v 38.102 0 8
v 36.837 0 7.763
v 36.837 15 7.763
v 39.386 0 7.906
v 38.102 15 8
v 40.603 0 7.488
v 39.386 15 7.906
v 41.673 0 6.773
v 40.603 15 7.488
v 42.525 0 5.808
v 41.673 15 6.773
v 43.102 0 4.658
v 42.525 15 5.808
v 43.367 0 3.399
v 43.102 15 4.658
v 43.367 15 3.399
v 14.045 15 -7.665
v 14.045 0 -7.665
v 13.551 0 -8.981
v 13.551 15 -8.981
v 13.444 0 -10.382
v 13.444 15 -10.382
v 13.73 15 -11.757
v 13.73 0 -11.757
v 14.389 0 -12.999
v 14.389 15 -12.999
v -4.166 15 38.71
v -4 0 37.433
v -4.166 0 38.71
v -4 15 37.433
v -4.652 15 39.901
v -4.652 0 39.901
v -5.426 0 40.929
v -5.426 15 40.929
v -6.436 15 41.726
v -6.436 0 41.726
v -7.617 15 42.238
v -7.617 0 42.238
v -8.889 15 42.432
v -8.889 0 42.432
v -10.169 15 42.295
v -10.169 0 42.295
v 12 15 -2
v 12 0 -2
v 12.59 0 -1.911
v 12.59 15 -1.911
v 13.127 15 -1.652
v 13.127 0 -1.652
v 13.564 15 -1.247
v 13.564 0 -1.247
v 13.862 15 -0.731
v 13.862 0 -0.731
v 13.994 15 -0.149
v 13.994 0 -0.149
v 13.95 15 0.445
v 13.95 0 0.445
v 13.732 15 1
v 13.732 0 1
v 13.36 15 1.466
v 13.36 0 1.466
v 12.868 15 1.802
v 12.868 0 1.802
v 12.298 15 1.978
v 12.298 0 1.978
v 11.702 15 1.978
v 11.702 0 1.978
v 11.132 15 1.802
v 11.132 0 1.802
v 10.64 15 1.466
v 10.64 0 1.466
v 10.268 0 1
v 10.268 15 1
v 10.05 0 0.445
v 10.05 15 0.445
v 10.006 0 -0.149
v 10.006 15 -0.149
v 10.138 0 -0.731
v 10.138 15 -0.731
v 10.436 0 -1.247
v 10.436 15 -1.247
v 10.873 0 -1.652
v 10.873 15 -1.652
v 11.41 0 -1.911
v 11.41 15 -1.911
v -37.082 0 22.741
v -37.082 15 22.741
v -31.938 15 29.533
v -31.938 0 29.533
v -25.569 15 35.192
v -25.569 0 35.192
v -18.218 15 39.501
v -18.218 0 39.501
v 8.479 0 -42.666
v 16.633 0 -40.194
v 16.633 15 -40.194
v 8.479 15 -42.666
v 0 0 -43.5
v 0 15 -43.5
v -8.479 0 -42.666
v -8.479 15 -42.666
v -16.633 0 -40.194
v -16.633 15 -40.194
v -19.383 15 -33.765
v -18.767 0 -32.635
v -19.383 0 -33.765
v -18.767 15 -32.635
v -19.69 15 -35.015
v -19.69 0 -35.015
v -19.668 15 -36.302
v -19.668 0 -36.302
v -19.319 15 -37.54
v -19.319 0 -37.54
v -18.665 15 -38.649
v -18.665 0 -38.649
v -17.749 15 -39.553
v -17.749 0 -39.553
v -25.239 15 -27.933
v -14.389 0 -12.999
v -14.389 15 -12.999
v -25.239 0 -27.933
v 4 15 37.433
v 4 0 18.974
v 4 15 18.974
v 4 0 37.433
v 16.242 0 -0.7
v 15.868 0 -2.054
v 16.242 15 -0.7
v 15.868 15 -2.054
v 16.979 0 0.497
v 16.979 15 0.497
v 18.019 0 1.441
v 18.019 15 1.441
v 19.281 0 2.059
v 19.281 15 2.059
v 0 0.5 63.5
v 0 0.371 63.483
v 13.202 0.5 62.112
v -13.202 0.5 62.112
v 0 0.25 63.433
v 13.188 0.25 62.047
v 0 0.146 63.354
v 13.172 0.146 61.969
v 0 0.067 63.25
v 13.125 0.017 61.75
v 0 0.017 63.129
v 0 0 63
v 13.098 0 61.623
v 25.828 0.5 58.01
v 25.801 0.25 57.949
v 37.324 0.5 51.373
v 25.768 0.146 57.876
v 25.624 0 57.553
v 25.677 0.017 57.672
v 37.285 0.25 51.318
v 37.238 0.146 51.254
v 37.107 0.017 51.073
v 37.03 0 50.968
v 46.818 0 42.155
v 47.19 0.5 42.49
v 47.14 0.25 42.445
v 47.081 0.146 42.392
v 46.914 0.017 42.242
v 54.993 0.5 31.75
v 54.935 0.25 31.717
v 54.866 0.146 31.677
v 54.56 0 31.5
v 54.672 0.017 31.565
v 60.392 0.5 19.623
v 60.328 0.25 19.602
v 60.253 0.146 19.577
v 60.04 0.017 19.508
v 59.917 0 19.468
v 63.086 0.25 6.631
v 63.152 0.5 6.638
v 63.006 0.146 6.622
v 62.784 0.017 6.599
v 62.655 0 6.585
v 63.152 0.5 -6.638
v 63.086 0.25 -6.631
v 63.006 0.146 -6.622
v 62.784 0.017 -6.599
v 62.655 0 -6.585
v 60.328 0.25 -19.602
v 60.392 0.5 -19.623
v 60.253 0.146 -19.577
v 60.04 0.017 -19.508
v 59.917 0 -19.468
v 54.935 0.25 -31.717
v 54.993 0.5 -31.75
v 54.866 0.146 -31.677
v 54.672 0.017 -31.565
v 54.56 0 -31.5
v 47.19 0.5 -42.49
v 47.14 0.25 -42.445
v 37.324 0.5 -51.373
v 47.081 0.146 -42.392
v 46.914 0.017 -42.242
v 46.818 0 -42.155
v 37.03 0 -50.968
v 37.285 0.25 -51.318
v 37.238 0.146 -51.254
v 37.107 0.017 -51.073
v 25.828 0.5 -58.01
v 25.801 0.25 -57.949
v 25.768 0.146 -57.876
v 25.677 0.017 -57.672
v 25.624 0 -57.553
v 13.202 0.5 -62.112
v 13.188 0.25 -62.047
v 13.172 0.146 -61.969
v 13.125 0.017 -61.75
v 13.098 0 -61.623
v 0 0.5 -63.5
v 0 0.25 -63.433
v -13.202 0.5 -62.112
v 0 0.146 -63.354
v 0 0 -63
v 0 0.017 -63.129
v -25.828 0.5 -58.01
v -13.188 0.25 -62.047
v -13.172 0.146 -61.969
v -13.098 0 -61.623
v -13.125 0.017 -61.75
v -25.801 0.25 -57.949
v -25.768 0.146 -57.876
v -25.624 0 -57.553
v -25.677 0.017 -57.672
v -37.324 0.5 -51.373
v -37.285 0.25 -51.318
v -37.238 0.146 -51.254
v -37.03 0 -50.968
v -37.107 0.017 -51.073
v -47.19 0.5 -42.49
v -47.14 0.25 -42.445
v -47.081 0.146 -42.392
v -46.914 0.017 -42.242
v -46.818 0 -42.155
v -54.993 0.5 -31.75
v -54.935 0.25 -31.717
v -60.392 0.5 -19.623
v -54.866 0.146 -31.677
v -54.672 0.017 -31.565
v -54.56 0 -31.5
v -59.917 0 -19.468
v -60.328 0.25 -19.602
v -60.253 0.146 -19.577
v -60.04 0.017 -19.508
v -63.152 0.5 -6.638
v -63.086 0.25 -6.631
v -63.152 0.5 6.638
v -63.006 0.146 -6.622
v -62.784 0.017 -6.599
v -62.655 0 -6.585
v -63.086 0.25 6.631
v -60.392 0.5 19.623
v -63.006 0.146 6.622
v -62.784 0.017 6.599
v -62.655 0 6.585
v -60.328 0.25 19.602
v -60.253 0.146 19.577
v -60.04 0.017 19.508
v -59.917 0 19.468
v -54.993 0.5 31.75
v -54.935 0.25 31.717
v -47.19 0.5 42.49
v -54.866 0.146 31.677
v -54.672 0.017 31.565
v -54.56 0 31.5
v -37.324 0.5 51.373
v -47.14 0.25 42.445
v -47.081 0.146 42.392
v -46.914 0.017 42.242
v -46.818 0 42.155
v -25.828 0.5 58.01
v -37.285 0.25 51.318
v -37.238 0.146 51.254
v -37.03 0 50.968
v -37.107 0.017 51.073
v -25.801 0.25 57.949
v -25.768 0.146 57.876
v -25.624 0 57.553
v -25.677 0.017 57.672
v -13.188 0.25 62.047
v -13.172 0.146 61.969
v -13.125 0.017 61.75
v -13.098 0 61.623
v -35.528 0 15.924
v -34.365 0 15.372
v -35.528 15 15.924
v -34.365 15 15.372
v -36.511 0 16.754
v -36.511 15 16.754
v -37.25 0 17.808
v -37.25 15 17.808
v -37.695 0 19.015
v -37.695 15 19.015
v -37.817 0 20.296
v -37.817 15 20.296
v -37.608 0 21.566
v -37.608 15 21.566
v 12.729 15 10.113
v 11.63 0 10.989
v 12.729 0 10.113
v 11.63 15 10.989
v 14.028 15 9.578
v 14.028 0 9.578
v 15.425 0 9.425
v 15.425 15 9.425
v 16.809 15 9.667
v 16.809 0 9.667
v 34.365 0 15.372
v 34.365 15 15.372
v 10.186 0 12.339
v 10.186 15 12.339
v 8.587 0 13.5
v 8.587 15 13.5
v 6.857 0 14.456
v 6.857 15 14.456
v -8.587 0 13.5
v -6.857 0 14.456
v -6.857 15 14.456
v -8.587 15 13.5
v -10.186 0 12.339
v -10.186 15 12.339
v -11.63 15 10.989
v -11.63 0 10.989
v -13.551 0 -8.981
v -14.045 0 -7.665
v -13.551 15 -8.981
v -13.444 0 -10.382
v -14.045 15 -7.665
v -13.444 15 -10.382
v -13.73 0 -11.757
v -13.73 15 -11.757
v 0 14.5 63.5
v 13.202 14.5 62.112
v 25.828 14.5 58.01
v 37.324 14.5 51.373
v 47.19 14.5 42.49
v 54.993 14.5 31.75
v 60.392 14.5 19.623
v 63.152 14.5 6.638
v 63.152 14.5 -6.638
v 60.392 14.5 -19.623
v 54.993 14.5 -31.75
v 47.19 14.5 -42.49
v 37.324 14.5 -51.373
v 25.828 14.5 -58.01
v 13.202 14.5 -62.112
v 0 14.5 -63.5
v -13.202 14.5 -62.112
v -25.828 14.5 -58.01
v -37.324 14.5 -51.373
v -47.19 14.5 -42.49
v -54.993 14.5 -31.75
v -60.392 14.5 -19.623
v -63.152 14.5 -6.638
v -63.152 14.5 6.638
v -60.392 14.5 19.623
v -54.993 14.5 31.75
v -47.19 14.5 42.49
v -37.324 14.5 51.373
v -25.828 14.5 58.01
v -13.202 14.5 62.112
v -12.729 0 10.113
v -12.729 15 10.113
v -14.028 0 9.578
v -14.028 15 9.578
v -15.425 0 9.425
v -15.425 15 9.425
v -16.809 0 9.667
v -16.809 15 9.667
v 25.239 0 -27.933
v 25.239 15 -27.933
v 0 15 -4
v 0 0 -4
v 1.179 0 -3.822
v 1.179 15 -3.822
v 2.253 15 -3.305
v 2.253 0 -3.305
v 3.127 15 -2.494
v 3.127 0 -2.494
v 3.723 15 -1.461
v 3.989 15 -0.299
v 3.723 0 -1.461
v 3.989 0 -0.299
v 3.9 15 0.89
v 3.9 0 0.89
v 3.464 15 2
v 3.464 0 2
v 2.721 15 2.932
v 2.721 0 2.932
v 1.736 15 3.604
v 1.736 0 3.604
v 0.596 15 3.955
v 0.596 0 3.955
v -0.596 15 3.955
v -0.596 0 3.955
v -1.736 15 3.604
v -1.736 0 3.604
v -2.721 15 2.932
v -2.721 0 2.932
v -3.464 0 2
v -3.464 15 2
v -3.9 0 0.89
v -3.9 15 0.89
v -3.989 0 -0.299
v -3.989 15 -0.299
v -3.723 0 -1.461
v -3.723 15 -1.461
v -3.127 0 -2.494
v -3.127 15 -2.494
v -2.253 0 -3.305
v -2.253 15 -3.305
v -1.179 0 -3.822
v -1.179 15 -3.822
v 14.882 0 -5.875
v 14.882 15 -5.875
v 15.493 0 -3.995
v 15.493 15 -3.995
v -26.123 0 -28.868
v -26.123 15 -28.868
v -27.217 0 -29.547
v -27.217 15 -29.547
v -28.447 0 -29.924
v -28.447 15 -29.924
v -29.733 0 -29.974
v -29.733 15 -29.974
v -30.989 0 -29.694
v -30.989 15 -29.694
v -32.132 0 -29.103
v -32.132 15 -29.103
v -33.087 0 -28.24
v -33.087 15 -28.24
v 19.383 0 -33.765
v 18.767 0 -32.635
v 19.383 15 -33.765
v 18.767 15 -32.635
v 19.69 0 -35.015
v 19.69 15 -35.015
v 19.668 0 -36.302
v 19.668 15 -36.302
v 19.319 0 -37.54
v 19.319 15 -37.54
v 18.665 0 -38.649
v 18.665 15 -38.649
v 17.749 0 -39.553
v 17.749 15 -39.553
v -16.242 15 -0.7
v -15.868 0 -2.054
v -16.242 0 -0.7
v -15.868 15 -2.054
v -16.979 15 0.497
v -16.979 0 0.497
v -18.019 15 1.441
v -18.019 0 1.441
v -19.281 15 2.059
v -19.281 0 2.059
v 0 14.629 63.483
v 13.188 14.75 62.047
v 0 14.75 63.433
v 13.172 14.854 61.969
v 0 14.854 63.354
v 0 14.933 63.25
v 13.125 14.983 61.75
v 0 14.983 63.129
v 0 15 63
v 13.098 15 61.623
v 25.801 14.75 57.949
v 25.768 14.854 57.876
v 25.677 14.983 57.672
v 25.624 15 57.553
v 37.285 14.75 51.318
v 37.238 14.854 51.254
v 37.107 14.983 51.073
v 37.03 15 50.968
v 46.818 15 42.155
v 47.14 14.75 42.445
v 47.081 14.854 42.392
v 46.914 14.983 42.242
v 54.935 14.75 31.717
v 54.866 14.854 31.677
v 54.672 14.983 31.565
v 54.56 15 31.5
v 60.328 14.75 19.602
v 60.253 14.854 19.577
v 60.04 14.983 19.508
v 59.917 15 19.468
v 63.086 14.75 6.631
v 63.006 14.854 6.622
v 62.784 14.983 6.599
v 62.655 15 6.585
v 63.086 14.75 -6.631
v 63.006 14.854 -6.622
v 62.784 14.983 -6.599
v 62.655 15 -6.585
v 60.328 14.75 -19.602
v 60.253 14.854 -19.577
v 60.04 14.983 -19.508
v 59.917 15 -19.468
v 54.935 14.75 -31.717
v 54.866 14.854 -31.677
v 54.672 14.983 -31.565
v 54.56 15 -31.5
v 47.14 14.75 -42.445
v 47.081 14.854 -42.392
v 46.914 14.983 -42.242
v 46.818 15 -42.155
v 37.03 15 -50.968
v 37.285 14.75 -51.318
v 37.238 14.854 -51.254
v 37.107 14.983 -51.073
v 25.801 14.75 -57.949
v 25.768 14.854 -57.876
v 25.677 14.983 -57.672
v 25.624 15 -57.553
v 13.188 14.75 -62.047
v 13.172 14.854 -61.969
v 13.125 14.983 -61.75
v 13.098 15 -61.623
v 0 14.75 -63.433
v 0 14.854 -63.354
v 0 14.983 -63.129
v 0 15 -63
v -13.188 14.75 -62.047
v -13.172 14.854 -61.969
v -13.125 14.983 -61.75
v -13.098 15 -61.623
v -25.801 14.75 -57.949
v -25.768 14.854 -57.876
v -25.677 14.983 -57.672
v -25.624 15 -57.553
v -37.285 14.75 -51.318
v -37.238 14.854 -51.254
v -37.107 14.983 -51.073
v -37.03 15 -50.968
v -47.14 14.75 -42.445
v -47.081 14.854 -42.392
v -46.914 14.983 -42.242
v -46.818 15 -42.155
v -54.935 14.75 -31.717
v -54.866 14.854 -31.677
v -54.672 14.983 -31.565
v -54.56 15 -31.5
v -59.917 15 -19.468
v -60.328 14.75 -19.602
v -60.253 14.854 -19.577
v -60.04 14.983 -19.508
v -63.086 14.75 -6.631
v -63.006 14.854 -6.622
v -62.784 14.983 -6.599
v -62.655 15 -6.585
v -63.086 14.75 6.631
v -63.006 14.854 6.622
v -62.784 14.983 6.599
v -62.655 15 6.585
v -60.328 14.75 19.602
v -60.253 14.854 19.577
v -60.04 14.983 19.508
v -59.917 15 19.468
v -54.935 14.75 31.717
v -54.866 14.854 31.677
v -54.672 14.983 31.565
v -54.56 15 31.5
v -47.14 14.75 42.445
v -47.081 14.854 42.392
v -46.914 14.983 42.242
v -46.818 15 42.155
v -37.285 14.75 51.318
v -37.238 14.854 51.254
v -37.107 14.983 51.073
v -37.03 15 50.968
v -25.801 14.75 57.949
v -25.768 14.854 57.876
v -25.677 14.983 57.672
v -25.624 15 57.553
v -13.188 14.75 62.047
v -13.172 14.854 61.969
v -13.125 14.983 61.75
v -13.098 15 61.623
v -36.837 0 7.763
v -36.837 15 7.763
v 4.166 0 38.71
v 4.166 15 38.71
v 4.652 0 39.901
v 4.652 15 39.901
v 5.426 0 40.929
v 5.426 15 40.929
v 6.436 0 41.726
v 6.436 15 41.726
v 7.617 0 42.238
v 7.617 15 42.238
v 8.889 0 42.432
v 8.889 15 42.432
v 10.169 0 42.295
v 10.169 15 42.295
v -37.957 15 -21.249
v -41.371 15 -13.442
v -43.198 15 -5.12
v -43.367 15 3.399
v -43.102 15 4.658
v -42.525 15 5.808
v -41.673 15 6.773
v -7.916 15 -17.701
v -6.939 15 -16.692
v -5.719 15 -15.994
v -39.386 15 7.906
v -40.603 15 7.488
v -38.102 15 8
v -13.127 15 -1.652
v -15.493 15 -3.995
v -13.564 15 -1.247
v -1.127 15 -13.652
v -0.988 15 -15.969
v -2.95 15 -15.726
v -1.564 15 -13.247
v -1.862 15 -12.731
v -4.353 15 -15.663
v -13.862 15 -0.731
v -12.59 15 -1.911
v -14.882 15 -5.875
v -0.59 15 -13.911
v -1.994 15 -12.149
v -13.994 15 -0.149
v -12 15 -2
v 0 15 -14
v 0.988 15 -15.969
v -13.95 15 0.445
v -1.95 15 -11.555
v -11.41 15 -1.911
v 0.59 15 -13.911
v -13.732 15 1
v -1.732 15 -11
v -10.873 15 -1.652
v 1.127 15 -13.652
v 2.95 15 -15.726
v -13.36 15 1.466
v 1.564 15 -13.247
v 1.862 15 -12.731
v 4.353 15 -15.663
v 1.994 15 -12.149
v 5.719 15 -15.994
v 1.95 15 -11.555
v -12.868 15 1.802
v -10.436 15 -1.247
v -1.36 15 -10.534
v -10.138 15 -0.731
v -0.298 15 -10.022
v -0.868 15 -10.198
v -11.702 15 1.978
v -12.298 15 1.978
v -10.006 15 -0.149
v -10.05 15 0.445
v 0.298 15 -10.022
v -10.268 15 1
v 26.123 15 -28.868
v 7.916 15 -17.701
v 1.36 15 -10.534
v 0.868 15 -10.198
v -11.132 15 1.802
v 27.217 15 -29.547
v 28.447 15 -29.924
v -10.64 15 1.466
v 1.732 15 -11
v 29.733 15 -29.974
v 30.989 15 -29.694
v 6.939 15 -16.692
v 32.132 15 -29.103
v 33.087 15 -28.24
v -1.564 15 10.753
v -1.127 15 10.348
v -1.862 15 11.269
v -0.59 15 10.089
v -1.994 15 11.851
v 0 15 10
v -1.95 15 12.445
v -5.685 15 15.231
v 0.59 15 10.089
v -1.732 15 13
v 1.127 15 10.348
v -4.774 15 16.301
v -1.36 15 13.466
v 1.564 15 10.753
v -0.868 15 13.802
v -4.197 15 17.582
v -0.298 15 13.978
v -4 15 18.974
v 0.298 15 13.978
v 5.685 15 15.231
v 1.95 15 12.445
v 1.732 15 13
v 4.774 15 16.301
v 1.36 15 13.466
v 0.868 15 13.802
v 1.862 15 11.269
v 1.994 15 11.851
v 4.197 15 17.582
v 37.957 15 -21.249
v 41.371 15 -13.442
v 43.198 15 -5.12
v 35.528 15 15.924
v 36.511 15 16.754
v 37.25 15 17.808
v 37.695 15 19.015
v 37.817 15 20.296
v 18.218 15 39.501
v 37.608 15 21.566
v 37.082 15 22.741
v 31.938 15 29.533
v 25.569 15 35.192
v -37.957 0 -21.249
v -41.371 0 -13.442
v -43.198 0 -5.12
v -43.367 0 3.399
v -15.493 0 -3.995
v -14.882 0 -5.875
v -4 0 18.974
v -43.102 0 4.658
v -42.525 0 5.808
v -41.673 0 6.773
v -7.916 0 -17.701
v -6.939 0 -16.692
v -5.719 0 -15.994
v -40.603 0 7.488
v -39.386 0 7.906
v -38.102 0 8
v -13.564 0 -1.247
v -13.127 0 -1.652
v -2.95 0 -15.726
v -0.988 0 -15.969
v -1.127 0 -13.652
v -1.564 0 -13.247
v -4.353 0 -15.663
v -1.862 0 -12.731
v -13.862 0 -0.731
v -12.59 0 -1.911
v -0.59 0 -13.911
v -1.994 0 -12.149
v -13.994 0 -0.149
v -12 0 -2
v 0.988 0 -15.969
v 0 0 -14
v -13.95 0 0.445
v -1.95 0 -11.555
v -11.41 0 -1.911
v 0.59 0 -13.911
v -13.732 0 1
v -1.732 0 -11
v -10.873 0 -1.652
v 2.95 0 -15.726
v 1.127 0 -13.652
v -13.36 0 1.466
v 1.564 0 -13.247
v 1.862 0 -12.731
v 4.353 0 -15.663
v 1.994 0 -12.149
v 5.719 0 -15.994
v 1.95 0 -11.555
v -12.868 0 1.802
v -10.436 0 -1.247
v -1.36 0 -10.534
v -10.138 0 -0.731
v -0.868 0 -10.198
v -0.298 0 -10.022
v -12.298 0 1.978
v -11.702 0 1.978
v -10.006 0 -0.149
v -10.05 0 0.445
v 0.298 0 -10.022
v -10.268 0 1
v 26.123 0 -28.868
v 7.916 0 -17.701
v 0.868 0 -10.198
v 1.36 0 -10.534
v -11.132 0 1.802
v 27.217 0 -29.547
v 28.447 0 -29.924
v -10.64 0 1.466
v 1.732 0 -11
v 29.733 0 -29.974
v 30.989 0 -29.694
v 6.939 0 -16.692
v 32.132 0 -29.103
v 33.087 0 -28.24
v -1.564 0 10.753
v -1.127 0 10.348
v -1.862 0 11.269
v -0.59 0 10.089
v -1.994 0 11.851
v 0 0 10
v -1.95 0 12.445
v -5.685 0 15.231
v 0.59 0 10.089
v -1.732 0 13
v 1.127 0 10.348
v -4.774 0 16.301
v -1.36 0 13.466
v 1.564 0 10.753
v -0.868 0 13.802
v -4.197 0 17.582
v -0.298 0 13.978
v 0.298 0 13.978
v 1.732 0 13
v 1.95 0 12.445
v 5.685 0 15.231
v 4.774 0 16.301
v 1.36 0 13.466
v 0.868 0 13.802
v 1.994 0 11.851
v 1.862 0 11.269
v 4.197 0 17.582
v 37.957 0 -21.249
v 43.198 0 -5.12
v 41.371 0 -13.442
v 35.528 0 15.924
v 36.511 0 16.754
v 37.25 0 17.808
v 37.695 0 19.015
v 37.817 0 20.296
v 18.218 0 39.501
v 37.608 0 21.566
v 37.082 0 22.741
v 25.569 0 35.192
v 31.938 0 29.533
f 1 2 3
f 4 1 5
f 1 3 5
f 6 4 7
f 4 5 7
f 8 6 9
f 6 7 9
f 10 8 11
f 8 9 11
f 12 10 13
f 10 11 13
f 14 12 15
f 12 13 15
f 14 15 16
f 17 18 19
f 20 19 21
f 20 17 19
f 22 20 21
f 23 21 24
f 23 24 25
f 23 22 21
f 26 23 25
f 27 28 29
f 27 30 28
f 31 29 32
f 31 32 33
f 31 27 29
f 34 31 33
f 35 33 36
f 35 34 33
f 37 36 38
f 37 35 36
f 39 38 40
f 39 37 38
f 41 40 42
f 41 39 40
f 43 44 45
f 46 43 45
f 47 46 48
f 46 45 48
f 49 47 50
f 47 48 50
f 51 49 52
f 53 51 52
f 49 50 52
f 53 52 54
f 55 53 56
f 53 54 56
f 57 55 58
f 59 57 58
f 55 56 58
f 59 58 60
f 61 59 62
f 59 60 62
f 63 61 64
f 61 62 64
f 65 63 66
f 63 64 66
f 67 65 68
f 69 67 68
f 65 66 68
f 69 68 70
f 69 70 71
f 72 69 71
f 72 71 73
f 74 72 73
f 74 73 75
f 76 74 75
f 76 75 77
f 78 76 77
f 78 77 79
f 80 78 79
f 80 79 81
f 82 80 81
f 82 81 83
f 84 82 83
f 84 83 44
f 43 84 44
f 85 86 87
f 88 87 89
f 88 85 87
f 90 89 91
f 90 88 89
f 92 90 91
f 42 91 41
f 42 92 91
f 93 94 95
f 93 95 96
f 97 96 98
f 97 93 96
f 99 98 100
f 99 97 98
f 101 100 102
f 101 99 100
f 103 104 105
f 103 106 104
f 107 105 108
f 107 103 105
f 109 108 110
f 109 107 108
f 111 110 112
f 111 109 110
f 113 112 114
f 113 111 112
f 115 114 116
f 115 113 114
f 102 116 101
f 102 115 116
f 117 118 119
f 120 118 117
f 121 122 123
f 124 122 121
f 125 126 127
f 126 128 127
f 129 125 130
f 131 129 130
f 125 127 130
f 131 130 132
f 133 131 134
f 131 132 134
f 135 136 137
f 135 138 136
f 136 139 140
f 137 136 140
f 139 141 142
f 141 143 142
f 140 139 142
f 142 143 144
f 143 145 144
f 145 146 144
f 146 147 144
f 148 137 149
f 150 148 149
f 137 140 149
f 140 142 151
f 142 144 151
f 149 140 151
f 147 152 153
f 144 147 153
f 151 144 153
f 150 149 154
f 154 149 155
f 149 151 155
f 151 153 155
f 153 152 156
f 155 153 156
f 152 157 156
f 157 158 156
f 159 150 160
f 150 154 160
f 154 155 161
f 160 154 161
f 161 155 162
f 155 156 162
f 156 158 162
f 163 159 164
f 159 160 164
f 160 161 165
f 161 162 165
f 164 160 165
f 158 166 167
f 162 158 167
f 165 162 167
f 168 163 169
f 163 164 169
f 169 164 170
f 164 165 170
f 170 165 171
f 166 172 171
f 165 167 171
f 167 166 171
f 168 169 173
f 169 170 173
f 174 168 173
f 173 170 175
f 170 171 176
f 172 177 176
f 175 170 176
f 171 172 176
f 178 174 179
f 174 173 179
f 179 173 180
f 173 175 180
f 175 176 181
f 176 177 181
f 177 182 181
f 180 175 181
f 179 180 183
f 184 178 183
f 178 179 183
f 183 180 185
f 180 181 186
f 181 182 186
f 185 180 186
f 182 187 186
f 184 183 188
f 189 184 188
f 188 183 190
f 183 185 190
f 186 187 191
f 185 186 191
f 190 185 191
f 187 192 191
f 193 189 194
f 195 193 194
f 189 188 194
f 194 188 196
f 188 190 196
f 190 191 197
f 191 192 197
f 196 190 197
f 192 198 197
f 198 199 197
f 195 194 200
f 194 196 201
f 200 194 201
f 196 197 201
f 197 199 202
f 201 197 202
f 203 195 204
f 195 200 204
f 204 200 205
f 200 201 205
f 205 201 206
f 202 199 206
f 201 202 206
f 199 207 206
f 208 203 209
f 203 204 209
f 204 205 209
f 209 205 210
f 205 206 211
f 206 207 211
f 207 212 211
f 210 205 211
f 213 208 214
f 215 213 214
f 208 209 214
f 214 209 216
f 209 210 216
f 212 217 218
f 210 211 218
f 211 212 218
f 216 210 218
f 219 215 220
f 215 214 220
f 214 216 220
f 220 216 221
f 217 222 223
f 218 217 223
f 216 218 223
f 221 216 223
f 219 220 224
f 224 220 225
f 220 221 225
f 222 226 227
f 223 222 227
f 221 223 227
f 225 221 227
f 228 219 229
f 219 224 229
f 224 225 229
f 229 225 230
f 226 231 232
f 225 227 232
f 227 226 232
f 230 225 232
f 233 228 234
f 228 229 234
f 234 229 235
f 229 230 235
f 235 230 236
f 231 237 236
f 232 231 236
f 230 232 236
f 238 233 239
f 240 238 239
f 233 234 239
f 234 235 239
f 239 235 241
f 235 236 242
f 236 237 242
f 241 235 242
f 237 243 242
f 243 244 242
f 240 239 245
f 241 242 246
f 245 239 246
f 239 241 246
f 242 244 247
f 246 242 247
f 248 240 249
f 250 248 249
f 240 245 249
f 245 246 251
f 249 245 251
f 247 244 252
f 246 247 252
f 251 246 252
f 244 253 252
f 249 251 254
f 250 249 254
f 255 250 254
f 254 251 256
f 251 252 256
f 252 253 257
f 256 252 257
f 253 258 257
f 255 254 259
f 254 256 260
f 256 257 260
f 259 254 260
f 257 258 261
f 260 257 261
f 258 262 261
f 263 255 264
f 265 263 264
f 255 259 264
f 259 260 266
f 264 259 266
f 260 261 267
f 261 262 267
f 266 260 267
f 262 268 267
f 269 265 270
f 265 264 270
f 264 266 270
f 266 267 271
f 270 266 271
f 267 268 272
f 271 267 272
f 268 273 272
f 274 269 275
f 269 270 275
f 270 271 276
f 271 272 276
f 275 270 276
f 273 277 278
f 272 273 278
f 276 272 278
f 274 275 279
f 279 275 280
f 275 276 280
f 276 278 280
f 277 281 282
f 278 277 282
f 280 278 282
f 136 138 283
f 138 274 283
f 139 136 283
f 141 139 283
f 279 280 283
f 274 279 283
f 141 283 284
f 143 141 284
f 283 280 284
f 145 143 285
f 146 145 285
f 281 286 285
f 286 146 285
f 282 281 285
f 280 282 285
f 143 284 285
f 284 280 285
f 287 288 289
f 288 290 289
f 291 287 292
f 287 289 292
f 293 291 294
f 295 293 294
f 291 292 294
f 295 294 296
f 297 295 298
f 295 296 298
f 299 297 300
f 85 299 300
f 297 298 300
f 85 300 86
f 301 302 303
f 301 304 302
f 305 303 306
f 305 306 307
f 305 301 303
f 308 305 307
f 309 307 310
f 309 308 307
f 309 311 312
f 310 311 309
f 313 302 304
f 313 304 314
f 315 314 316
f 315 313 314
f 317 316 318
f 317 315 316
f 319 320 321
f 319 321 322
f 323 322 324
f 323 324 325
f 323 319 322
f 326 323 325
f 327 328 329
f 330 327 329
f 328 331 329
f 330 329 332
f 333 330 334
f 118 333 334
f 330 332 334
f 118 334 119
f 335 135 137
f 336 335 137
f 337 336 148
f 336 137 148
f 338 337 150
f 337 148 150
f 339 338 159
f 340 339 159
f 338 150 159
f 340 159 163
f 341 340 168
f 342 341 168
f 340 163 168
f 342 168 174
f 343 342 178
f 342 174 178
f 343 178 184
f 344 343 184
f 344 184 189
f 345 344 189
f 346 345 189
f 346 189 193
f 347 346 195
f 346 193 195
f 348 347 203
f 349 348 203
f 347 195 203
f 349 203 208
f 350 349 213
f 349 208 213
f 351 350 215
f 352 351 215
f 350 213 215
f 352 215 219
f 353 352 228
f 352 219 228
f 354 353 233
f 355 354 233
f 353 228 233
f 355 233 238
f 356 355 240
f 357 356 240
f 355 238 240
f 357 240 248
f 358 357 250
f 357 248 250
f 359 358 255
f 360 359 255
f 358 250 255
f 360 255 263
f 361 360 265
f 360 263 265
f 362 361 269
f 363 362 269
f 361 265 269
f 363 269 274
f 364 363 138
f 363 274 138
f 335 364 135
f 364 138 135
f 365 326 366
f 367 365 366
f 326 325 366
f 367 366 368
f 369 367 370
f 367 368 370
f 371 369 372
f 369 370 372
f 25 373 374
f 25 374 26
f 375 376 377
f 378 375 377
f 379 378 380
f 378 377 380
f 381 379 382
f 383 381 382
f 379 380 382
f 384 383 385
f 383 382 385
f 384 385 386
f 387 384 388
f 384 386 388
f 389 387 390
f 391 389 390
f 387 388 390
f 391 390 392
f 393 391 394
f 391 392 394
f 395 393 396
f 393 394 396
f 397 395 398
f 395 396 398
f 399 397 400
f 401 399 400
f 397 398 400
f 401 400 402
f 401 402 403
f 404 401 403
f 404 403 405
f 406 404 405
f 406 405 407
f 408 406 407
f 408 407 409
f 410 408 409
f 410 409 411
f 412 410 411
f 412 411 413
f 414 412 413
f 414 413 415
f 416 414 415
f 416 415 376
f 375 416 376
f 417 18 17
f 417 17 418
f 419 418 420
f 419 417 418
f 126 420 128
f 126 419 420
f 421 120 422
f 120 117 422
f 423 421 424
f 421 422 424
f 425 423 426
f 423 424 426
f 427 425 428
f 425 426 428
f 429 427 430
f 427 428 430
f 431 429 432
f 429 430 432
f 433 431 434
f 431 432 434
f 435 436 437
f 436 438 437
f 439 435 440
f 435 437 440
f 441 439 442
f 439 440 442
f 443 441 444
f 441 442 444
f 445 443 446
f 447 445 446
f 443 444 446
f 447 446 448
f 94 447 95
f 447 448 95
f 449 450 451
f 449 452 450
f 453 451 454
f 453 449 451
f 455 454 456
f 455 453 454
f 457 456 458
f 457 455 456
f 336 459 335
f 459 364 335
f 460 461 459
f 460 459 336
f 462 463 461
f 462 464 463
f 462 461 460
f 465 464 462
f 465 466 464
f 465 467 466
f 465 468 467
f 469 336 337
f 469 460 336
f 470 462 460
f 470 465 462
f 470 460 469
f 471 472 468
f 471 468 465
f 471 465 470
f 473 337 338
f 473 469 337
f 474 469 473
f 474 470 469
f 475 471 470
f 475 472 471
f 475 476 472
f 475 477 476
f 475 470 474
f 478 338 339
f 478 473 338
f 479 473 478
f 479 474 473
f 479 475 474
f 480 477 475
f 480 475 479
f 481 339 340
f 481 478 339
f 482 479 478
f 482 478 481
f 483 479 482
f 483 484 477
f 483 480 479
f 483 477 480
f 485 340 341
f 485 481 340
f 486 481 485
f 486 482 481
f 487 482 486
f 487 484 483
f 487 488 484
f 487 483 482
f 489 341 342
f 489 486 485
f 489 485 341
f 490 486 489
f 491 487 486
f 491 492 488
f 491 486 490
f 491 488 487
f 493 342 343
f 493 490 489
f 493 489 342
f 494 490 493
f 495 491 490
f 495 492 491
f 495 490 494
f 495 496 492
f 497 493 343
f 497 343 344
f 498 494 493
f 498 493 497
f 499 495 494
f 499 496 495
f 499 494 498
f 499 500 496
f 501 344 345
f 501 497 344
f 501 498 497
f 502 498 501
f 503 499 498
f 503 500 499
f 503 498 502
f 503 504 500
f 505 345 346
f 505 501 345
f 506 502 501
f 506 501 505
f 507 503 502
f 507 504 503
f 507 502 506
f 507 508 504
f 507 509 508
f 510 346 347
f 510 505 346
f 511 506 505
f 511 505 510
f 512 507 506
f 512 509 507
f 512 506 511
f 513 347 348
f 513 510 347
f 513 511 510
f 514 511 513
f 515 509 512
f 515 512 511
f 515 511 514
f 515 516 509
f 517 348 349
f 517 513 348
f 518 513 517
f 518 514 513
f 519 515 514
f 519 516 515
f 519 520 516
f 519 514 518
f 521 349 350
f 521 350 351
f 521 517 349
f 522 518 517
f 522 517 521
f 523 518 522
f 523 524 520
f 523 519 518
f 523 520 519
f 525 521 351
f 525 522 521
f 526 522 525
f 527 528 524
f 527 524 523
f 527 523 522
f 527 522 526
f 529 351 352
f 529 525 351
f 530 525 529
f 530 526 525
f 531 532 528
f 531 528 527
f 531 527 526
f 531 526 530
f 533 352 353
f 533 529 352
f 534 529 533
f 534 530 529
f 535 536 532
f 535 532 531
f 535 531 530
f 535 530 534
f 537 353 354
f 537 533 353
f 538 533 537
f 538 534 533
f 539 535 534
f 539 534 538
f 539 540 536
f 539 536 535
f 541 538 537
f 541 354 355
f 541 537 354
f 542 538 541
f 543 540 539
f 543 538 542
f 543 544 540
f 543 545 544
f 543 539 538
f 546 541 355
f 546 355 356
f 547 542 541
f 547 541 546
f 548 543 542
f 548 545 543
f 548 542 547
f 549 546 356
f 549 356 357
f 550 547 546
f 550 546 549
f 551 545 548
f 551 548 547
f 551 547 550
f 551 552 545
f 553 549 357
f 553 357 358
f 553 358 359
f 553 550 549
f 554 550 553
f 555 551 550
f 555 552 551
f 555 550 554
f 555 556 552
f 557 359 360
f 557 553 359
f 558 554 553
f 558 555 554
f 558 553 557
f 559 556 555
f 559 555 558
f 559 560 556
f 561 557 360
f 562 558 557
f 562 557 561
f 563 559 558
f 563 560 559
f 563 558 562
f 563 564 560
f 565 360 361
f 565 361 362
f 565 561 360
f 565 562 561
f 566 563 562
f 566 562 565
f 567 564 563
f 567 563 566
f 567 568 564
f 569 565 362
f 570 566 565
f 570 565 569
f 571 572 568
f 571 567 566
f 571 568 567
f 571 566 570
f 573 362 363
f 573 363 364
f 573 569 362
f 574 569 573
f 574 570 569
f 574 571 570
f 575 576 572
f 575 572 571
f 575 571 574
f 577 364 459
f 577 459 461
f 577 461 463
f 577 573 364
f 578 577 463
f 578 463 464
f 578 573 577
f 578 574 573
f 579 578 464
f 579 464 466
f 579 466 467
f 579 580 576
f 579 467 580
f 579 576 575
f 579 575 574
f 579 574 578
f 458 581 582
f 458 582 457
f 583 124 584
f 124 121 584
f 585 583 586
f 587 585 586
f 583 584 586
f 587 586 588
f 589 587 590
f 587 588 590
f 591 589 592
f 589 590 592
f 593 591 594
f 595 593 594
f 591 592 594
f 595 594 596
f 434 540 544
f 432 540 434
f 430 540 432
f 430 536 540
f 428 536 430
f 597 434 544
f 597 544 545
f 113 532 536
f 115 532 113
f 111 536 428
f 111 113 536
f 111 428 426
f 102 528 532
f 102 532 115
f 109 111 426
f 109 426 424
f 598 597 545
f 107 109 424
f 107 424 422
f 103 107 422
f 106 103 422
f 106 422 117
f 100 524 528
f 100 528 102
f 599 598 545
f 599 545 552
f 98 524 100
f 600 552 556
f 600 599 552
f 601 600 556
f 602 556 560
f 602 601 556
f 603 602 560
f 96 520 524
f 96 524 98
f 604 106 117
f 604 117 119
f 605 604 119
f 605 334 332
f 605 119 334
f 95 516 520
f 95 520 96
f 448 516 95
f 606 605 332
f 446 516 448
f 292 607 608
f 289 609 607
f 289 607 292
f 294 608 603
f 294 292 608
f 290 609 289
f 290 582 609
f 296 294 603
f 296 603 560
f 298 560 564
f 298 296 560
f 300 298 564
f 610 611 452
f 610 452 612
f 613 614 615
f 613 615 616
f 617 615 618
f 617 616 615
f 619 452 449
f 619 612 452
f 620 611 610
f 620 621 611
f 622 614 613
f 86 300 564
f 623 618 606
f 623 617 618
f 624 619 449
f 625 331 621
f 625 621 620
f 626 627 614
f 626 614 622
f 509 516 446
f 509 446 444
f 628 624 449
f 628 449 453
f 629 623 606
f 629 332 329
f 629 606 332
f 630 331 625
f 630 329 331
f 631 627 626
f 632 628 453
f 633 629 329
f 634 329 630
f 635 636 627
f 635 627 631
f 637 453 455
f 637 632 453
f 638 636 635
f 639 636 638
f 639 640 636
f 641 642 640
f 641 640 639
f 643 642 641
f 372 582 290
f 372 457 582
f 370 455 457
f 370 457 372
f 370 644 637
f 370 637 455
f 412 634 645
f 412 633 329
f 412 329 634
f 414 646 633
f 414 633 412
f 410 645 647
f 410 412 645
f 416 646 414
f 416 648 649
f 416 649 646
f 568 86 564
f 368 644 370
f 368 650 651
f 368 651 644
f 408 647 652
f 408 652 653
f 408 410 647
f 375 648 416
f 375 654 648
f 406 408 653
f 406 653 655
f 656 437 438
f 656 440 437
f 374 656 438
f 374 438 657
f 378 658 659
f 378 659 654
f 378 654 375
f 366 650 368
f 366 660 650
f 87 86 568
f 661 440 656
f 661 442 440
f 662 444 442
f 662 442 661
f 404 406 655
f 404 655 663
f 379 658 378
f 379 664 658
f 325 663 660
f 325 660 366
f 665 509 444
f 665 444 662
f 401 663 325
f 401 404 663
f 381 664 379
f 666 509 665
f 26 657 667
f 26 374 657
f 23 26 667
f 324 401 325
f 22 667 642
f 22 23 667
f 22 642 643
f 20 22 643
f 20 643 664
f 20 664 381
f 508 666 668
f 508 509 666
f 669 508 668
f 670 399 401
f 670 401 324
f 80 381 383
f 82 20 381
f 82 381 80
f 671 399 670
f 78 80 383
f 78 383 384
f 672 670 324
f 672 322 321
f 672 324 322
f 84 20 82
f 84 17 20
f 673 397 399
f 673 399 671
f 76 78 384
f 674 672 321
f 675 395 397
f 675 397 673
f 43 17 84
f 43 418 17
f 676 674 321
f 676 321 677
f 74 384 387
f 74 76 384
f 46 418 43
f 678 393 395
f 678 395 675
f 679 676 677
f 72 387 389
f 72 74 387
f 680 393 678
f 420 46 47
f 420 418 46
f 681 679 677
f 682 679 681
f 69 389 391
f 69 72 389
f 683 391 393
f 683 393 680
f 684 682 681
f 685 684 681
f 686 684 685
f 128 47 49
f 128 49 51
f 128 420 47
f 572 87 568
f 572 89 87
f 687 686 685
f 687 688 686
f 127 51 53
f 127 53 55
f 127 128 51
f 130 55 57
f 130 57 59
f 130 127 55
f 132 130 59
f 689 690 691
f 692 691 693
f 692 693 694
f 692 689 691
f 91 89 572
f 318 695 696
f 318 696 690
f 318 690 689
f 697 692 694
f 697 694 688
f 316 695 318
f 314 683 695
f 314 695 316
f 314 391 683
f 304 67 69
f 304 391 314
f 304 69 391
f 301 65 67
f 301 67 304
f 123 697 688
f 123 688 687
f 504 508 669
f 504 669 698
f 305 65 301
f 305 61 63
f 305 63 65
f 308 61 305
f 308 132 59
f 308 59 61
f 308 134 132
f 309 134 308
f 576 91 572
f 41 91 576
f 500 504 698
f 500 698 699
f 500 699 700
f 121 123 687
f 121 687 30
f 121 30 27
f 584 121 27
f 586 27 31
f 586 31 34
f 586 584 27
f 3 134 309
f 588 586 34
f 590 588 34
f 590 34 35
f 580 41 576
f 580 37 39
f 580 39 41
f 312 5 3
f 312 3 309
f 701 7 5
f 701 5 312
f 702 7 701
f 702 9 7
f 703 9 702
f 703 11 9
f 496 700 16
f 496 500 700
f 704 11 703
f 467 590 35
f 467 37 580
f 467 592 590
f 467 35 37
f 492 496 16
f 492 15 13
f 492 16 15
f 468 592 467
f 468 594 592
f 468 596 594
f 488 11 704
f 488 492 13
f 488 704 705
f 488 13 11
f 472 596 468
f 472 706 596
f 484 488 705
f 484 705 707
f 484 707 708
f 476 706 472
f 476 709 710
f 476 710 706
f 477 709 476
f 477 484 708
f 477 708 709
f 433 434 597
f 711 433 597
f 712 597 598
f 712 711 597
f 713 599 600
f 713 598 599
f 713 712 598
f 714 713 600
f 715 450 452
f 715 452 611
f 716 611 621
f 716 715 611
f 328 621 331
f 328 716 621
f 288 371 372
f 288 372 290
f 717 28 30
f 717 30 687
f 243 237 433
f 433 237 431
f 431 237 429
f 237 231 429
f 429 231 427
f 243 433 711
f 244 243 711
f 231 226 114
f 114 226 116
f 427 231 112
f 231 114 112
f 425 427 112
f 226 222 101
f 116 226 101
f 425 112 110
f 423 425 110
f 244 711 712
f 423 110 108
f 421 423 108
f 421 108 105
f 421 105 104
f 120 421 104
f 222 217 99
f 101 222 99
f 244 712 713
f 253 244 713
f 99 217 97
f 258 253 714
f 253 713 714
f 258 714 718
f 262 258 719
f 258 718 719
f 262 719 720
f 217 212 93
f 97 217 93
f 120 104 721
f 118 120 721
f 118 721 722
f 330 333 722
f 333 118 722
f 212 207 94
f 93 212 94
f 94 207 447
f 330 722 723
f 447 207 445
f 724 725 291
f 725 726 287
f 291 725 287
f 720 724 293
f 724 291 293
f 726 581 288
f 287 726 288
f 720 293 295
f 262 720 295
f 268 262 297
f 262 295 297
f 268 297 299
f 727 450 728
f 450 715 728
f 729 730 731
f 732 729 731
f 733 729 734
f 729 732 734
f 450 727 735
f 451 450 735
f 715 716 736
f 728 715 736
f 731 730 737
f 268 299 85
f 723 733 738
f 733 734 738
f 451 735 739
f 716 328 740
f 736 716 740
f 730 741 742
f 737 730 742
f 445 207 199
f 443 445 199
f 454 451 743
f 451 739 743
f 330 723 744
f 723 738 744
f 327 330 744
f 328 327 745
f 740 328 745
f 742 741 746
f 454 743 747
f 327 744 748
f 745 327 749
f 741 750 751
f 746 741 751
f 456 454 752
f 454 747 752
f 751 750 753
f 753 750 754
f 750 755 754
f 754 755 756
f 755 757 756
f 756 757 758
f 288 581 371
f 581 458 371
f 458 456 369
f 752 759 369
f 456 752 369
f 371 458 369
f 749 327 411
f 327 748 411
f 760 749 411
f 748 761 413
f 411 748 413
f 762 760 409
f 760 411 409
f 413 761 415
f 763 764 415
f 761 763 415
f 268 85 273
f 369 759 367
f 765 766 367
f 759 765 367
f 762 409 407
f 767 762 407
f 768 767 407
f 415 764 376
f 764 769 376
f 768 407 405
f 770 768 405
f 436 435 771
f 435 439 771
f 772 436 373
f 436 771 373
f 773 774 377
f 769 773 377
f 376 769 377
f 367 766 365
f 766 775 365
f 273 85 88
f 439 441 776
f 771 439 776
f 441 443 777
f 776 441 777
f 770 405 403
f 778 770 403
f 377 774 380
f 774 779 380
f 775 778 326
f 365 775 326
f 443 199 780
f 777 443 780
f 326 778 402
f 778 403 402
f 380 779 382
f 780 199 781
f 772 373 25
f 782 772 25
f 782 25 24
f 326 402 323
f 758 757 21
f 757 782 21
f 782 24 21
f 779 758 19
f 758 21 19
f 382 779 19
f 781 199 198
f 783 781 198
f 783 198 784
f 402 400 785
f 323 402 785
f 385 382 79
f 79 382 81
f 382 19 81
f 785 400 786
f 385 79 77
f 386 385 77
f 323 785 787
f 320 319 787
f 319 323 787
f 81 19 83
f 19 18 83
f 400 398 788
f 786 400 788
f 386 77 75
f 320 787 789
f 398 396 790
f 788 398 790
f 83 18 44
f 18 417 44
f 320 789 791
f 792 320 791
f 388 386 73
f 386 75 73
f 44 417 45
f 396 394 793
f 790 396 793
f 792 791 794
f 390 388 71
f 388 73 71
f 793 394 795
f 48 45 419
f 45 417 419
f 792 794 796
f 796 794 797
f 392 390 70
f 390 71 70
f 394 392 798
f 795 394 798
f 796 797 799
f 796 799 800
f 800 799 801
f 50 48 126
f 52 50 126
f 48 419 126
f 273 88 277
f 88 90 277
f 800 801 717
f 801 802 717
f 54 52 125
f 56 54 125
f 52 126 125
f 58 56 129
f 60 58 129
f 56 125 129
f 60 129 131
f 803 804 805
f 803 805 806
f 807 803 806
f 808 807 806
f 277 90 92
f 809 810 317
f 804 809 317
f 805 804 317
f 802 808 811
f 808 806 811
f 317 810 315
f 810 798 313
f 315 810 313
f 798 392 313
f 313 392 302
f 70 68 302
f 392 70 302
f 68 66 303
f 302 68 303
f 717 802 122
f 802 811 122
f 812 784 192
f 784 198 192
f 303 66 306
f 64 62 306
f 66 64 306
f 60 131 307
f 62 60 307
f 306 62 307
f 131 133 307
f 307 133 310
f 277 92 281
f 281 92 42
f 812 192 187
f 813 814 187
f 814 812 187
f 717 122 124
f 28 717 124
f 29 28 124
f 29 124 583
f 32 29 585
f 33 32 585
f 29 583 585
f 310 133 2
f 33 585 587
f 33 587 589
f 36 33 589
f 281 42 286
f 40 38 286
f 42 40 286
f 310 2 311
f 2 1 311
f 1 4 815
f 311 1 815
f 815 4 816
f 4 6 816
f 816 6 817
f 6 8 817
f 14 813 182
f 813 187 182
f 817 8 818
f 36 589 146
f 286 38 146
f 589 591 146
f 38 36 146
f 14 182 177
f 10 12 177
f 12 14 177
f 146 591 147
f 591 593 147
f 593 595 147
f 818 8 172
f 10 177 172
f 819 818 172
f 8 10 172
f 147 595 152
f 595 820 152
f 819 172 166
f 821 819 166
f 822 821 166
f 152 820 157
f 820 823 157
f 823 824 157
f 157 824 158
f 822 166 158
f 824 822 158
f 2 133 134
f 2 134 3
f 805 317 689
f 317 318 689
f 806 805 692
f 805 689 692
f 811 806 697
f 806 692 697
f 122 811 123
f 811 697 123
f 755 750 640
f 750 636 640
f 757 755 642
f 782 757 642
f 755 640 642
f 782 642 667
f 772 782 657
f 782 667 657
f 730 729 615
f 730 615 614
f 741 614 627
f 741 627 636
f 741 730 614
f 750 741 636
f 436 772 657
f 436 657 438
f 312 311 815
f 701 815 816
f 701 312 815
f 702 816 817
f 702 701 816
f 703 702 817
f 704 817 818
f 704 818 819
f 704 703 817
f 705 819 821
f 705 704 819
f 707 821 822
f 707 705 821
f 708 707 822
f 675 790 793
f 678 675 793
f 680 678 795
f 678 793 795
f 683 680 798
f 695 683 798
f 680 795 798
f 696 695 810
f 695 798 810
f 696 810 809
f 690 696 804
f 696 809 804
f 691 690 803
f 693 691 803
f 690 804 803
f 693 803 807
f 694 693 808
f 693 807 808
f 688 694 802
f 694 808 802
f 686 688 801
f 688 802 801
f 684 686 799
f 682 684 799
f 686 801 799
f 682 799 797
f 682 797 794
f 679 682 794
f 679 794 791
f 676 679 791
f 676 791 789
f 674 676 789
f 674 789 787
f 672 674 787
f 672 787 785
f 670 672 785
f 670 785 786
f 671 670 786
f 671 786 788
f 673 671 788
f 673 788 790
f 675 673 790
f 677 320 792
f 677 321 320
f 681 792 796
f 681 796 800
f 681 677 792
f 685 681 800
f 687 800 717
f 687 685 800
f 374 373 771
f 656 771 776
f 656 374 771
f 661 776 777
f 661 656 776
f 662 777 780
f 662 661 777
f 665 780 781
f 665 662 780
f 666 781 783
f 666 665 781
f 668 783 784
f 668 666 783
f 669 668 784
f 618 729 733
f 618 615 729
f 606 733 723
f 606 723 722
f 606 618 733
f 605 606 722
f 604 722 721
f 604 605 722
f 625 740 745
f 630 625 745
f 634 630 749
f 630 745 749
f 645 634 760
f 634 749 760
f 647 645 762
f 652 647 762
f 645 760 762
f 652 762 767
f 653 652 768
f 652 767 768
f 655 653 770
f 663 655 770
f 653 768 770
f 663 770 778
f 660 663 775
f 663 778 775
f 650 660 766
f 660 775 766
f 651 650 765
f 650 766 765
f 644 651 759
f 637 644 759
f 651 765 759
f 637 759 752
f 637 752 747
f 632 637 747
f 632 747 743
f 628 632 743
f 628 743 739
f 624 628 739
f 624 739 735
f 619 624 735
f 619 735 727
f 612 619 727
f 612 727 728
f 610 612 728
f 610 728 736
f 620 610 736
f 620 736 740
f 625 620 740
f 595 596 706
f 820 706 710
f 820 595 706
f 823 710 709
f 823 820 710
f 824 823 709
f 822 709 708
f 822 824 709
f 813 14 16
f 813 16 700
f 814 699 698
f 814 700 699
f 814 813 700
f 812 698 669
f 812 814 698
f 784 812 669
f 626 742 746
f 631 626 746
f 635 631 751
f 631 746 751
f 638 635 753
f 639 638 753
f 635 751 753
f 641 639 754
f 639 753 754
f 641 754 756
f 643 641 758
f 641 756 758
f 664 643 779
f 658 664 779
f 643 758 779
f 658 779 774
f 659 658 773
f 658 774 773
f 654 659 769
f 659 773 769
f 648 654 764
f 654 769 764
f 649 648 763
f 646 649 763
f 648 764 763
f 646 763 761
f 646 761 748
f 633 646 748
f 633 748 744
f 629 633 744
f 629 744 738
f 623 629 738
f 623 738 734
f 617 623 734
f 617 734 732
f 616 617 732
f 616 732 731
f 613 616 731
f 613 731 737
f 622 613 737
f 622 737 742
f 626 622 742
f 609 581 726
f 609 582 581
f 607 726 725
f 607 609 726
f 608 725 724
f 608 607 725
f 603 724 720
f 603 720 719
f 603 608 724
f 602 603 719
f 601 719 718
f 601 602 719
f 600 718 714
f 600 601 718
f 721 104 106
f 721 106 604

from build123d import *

# Parameters (mm, degrees)
SKETCH2_R           = 63.5
BOSS_EXTRUDE1_DEPTH = 15
FILLET2_R           = 0.5
CUT_EXTRUDE3_REACH  = 93.047
CUT_EXTRUDE4_REACH  = 93.047
SKETCH6_R           = 2
FILLET3_R           = 5
SKETCH6_4_R         = 2
SKETCH6_4_R_2       = 4
CUT_EXTRUDE5_DEPTH  = 92.046691388


with BuildPart() as part:
    # Sketch2 → Boss-Extrude1 (new body)
    with BuildSketch(Plane(origin=(0, 0, 0), x_dir=(1, 0, 0), z_dir=(0, 1, 0))):
        Circle(SKETCH2_R)
    extrude(amount=BOSS_EXTRUDE1_DEPTH)

    # Fillet2
    fillet2_edges = [part.edges().sort_by_distance(p)[0] for p in [
        (-63.5, 15, 0),
        (-63.5, 0, 0),
    ]]
    fillet(fillet2_edges, radius=FILLET2_R)

    # Sketch5 → Cut-Extrude3 (cut, up to next)
    with BuildSketch(Plane.XZ, mode=Mode.PRIVATE) as cut_extrude3_sk1:
        with BuildLine():
            ThreePointArc((-13.497636218, 8.591496757), (-9.404564037, 12.94427191), (-4, 15.491933385))
            Line((-4, 15.491933385), (-4, 43.315701541))
            ThreePointArc((-4, 43.315701541), (-25.568658475, 35.192239255), (-39.959612231, 17.189513965))
            Line((-39.959612231, 17.189513965), (-13.497636218, 8.591496757))
        make_face()
    cut_extrude3_tool1 = extrude(cut_extrude3_sk1.sketch, amount=-CUT_EXTRUDE3_REACH, mode=Mode.PRIVATE) & part.part
    # Sketch5 → Cut-Extrude3 (cut, up to next)
    with BuildSketch(Plane.XZ, mode=Mode.PRIVATE) as cut_extrude3_sk2:
        with BuildLine():
            Line((4, 43.315701541), (4, 15.491933385))
            ThreePointArc((4, 15.491933385), (9.404564037, 12.94427191), (13.497636218, 8.591496757))
            Line((13.497636218, 8.591496757), (39.959612231, 17.189513965))
            ThreePointArc((39.959612231, 17.189513965), (25.568658475, 35.192239255), (4, 43.315701541))
        make_face()
    cut_extrude3_tool2 = extrude(cut_extrude3_sk2.sketch, amount=-CUT_EXTRUDE3_REACH, mode=Mode.PRIVATE) & part.part
    # Sketch5 → Cut-Extrude3 (cut, up to next)
    with BuildSketch(Plane.XZ, mode=Mode.PRIVATE) as cut_extrude3_sk3:
        with BuildLine():
            Line((42.431748186, 9.581061834), (15.969772173, 0.983044626))
            ThreePointArc((15.969772173, 0.983044626), (15.216904261, -4.94427191), (12.341997951, -10.182096375))
            Line((12.341997951, -10.182096375), (28.696398536, -32.691997661))
            ThreePointArc((28.696398536, -32.691997661), (41.370958459, -13.442239255), (42.431748186, 9.581061834))
        make_face()
    cut_extrude3_tool3 = extrude(cut_extrude3_sk3.sketch, amount=-CUT_EXTRUDE3_REACH, mode=Mode.PRIVATE) & part.part
    # Sketch5 → Cut-Extrude3 (cut, up to next)
    with BuildSketch(Plane.XZ, mode=Mode.PRIVATE) as cut_extrude3_sk4:
        with BuildLine():
            Line((22.224262581, -37.394279679), (5.869861996, -14.884378393))
            ThreePointArc((5.869861996, -14.884378393), (0, -16), (-5.869861996, -14.884378393))
            Line((-5.869861996, -14.884378393), (-22.224262581, -37.394279679))
            ThreePointArc((-22.224262581, -37.394279679), (0, -43.5), (22.224262581, -37.394279679))
        make_face()
    cut_extrude3_tool4 = extrude(cut_extrude3_sk4.sketch, amount=-CUT_EXTRUDE3_REACH, mode=Mode.PRIVATE) & part.part
    # Sketch5 → Cut-Extrude3 (cut, up to next)
    with BuildSketch(Plane.XZ, mode=Mode.PRIVATE) as cut_extrude3_sk5:
        with BuildLine():
            Line((-28.696398536, -32.691997661), (-12.341997951, -10.182096375))
            ThreePointArc((-12.341997951, -10.182096375), (-15.216904261, -4.94427191), (-15.969772173, 0.983044626))
            Line((-15.969772173, 0.983044626), (-42.431748186, 9.581061834))
            ThreePointArc((-42.431748186, 9.581061834), (-41.370958459, -13.442239255), (-28.696398536, -32.691997661))
        make_face()
    cut_extrude3_tool5 = extrude(cut_extrude3_sk5.sketch, amount=-CUT_EXTRUDE3_REACH, mode=Mode.PRIVATE) & part.part
    add(cut_extrude3_tool1.solids().sort_by_distance((-18.272678, 0, 25.150183))[0], mode=Mode.SUBTRACT)
    add(cut_extrude3_tool2.solids().sort_by_distance((18.272678, 0, 25.150183))[0], mode=Mode.SUBTRACT)
    add(cut_extrude3_tool3.solids().sort_by_distance((29.565814, 0, -9.606515))[0], mode=Mode.SUBTRACT)
    add(cut_extrude3_tool4.solids().sort_by_distance((0, 0, -31.087336))[0], mode=Mode.SUBTRACT)
    add(cut_extrude3_tool5.solids().sort_by_distance((-29.565814, 0, -9.606515))[0], mode=Mode.SUBTRACT)

    # Sketch6 → Cut-Extrude4 (cut, up to next)
    with BuildSketch(Plane.XZ, mode=Mode.PRIVATE) as cut_extrude4_sk1:
        with Locations((12, 0)):
            Circle(SKETCH6_R)
    cut_extrude4_tool1 = extrude(cut_extrude4_sk1.sketch, amount=-CUT_EXTRUDE4_REACH, mode=Mode.PRIVATE) & part.part
    # Sketch6 → Cut-Extrude4 (cut, up to next)
    with BuildSketch(Plane.XZ, mode=Mode.PRIVATE) as cut_extrude4_sk2:
        with Locations((0, -12)):
            Circle(SKETCH6_R)
    cut_extrude4_tool2 = extrude(cut_extrude4_sk2.sketch, amount=-CUT_EXTRUDE4_REACH, mode=Mode.PRIVATE) & part.part
    # Sketch6 → Cut-Extrude4 (cut, up to next)
    with BuildSketch(Plane.XZ, mode=Mode.PRIVATE) as cut_extrude4_sk3:
        with Locations((-12, 0)):
            Circle(SKETCH6_R)
    cut_extrude4_tool3 = extrude(cut_extrude4_sk3.sketch, amount=-CUT_EXTRUDE4_REACH, mode=Mode.PRIVATE) & part.part
    # Sketch6 → Cut-Extrude4 (cut, up to next)
    with BuildSketch(Plane.XZ, mode=Mode.PRIVATE) as cut_extrude4_sk4:
        with Locations((0, 12)):
            Circle(SKETCH6_R)
    cut_extrude4_tool4 = extrude(cut_extrude4_sk4.sketch, amount=-CUT_EXTRUDE4_REACH, mode=Mode.PRIVATE) & part.part
    add(cut_extrude4_tool1.solids().sort_by_distance((12, 0, 0))[0], mode=Mode.SUBTRACT)
    add(cut_extrude4_tool2.solids().sort_by_distance((0, 0, -12))[0], mode=Mode.SUBTRACT)
    add(cut_extrude4_tool3.solids().sort_by_distance((-12, 0, 0))[0], mode=Mode.SUBTRACT)
    add(cut_extrude4_tool4.solids().sort_by_distance((0, 0, 12))[0], mode=Mode.SUBTRACT)

    # Fillet3
    fillet3_edges = [part.edges().sort_by_distance(p)[0] for p in [
        (13.497636218, 7.5, 8.591496757),
        (4, 7.5, 15.491933385),
        (39.959612231, 7.5, 17.189513965),
        (4, 7.5, 43.315701541),
        (-4, 7.5, 43.315701541),
        (-4, 7.5, 15.491933385),
        (-13.497636218, 7.5, 8.591496757),
        (-39.959612231, 7.5, 17.189513965),
        (-42.431748186, 7.5, 9.581061834),
        (-15.969772173, 7.5, 0.983044626),
        (-12.341997951, 7.5, -10.182096375),
        (-28.696398536, 7.5, -32.691997661),
        (-22.224262581, 7.5, -37.394279679),
        (22.224262581, 7.5, -37.394279679),
        (5.869861996, 7.5, -14.884378393),
        (28.696398536, 7.5, -32.691997661),
        (42.431748186, 7.5, 9.581061834),
        (-5.869861996, 7.5, -14.884378393),
        (12.341997951, 7.5, -10.182096375),
        (15.969772173, 7.5, 0.983044626),
    ]]
    fillet(fillet3_edges, radius=FILLET3_R)

    # Sketch6<4> → Cut-Extrude5 (cut, through all)
    with BuildSketch(Plane.XZ):
        with Locations((12, 0)):
            Circle(SKETCH6_4_R)
        with Locations((0, -12)):
            Circle(SKETCH6_4_R)
        with Locations((-12, 0)):
            Circle(SKETCH6_4_R)
        with Locations((0, 12)):
            Circle(SKETCH6_4_R)
        Circle(SKETCH6_4_R_2)
    extrude(amount=-CUT_EXTRUDE5_DEPTH, mode=Mode.SUBTRACT)


solid = part.part
